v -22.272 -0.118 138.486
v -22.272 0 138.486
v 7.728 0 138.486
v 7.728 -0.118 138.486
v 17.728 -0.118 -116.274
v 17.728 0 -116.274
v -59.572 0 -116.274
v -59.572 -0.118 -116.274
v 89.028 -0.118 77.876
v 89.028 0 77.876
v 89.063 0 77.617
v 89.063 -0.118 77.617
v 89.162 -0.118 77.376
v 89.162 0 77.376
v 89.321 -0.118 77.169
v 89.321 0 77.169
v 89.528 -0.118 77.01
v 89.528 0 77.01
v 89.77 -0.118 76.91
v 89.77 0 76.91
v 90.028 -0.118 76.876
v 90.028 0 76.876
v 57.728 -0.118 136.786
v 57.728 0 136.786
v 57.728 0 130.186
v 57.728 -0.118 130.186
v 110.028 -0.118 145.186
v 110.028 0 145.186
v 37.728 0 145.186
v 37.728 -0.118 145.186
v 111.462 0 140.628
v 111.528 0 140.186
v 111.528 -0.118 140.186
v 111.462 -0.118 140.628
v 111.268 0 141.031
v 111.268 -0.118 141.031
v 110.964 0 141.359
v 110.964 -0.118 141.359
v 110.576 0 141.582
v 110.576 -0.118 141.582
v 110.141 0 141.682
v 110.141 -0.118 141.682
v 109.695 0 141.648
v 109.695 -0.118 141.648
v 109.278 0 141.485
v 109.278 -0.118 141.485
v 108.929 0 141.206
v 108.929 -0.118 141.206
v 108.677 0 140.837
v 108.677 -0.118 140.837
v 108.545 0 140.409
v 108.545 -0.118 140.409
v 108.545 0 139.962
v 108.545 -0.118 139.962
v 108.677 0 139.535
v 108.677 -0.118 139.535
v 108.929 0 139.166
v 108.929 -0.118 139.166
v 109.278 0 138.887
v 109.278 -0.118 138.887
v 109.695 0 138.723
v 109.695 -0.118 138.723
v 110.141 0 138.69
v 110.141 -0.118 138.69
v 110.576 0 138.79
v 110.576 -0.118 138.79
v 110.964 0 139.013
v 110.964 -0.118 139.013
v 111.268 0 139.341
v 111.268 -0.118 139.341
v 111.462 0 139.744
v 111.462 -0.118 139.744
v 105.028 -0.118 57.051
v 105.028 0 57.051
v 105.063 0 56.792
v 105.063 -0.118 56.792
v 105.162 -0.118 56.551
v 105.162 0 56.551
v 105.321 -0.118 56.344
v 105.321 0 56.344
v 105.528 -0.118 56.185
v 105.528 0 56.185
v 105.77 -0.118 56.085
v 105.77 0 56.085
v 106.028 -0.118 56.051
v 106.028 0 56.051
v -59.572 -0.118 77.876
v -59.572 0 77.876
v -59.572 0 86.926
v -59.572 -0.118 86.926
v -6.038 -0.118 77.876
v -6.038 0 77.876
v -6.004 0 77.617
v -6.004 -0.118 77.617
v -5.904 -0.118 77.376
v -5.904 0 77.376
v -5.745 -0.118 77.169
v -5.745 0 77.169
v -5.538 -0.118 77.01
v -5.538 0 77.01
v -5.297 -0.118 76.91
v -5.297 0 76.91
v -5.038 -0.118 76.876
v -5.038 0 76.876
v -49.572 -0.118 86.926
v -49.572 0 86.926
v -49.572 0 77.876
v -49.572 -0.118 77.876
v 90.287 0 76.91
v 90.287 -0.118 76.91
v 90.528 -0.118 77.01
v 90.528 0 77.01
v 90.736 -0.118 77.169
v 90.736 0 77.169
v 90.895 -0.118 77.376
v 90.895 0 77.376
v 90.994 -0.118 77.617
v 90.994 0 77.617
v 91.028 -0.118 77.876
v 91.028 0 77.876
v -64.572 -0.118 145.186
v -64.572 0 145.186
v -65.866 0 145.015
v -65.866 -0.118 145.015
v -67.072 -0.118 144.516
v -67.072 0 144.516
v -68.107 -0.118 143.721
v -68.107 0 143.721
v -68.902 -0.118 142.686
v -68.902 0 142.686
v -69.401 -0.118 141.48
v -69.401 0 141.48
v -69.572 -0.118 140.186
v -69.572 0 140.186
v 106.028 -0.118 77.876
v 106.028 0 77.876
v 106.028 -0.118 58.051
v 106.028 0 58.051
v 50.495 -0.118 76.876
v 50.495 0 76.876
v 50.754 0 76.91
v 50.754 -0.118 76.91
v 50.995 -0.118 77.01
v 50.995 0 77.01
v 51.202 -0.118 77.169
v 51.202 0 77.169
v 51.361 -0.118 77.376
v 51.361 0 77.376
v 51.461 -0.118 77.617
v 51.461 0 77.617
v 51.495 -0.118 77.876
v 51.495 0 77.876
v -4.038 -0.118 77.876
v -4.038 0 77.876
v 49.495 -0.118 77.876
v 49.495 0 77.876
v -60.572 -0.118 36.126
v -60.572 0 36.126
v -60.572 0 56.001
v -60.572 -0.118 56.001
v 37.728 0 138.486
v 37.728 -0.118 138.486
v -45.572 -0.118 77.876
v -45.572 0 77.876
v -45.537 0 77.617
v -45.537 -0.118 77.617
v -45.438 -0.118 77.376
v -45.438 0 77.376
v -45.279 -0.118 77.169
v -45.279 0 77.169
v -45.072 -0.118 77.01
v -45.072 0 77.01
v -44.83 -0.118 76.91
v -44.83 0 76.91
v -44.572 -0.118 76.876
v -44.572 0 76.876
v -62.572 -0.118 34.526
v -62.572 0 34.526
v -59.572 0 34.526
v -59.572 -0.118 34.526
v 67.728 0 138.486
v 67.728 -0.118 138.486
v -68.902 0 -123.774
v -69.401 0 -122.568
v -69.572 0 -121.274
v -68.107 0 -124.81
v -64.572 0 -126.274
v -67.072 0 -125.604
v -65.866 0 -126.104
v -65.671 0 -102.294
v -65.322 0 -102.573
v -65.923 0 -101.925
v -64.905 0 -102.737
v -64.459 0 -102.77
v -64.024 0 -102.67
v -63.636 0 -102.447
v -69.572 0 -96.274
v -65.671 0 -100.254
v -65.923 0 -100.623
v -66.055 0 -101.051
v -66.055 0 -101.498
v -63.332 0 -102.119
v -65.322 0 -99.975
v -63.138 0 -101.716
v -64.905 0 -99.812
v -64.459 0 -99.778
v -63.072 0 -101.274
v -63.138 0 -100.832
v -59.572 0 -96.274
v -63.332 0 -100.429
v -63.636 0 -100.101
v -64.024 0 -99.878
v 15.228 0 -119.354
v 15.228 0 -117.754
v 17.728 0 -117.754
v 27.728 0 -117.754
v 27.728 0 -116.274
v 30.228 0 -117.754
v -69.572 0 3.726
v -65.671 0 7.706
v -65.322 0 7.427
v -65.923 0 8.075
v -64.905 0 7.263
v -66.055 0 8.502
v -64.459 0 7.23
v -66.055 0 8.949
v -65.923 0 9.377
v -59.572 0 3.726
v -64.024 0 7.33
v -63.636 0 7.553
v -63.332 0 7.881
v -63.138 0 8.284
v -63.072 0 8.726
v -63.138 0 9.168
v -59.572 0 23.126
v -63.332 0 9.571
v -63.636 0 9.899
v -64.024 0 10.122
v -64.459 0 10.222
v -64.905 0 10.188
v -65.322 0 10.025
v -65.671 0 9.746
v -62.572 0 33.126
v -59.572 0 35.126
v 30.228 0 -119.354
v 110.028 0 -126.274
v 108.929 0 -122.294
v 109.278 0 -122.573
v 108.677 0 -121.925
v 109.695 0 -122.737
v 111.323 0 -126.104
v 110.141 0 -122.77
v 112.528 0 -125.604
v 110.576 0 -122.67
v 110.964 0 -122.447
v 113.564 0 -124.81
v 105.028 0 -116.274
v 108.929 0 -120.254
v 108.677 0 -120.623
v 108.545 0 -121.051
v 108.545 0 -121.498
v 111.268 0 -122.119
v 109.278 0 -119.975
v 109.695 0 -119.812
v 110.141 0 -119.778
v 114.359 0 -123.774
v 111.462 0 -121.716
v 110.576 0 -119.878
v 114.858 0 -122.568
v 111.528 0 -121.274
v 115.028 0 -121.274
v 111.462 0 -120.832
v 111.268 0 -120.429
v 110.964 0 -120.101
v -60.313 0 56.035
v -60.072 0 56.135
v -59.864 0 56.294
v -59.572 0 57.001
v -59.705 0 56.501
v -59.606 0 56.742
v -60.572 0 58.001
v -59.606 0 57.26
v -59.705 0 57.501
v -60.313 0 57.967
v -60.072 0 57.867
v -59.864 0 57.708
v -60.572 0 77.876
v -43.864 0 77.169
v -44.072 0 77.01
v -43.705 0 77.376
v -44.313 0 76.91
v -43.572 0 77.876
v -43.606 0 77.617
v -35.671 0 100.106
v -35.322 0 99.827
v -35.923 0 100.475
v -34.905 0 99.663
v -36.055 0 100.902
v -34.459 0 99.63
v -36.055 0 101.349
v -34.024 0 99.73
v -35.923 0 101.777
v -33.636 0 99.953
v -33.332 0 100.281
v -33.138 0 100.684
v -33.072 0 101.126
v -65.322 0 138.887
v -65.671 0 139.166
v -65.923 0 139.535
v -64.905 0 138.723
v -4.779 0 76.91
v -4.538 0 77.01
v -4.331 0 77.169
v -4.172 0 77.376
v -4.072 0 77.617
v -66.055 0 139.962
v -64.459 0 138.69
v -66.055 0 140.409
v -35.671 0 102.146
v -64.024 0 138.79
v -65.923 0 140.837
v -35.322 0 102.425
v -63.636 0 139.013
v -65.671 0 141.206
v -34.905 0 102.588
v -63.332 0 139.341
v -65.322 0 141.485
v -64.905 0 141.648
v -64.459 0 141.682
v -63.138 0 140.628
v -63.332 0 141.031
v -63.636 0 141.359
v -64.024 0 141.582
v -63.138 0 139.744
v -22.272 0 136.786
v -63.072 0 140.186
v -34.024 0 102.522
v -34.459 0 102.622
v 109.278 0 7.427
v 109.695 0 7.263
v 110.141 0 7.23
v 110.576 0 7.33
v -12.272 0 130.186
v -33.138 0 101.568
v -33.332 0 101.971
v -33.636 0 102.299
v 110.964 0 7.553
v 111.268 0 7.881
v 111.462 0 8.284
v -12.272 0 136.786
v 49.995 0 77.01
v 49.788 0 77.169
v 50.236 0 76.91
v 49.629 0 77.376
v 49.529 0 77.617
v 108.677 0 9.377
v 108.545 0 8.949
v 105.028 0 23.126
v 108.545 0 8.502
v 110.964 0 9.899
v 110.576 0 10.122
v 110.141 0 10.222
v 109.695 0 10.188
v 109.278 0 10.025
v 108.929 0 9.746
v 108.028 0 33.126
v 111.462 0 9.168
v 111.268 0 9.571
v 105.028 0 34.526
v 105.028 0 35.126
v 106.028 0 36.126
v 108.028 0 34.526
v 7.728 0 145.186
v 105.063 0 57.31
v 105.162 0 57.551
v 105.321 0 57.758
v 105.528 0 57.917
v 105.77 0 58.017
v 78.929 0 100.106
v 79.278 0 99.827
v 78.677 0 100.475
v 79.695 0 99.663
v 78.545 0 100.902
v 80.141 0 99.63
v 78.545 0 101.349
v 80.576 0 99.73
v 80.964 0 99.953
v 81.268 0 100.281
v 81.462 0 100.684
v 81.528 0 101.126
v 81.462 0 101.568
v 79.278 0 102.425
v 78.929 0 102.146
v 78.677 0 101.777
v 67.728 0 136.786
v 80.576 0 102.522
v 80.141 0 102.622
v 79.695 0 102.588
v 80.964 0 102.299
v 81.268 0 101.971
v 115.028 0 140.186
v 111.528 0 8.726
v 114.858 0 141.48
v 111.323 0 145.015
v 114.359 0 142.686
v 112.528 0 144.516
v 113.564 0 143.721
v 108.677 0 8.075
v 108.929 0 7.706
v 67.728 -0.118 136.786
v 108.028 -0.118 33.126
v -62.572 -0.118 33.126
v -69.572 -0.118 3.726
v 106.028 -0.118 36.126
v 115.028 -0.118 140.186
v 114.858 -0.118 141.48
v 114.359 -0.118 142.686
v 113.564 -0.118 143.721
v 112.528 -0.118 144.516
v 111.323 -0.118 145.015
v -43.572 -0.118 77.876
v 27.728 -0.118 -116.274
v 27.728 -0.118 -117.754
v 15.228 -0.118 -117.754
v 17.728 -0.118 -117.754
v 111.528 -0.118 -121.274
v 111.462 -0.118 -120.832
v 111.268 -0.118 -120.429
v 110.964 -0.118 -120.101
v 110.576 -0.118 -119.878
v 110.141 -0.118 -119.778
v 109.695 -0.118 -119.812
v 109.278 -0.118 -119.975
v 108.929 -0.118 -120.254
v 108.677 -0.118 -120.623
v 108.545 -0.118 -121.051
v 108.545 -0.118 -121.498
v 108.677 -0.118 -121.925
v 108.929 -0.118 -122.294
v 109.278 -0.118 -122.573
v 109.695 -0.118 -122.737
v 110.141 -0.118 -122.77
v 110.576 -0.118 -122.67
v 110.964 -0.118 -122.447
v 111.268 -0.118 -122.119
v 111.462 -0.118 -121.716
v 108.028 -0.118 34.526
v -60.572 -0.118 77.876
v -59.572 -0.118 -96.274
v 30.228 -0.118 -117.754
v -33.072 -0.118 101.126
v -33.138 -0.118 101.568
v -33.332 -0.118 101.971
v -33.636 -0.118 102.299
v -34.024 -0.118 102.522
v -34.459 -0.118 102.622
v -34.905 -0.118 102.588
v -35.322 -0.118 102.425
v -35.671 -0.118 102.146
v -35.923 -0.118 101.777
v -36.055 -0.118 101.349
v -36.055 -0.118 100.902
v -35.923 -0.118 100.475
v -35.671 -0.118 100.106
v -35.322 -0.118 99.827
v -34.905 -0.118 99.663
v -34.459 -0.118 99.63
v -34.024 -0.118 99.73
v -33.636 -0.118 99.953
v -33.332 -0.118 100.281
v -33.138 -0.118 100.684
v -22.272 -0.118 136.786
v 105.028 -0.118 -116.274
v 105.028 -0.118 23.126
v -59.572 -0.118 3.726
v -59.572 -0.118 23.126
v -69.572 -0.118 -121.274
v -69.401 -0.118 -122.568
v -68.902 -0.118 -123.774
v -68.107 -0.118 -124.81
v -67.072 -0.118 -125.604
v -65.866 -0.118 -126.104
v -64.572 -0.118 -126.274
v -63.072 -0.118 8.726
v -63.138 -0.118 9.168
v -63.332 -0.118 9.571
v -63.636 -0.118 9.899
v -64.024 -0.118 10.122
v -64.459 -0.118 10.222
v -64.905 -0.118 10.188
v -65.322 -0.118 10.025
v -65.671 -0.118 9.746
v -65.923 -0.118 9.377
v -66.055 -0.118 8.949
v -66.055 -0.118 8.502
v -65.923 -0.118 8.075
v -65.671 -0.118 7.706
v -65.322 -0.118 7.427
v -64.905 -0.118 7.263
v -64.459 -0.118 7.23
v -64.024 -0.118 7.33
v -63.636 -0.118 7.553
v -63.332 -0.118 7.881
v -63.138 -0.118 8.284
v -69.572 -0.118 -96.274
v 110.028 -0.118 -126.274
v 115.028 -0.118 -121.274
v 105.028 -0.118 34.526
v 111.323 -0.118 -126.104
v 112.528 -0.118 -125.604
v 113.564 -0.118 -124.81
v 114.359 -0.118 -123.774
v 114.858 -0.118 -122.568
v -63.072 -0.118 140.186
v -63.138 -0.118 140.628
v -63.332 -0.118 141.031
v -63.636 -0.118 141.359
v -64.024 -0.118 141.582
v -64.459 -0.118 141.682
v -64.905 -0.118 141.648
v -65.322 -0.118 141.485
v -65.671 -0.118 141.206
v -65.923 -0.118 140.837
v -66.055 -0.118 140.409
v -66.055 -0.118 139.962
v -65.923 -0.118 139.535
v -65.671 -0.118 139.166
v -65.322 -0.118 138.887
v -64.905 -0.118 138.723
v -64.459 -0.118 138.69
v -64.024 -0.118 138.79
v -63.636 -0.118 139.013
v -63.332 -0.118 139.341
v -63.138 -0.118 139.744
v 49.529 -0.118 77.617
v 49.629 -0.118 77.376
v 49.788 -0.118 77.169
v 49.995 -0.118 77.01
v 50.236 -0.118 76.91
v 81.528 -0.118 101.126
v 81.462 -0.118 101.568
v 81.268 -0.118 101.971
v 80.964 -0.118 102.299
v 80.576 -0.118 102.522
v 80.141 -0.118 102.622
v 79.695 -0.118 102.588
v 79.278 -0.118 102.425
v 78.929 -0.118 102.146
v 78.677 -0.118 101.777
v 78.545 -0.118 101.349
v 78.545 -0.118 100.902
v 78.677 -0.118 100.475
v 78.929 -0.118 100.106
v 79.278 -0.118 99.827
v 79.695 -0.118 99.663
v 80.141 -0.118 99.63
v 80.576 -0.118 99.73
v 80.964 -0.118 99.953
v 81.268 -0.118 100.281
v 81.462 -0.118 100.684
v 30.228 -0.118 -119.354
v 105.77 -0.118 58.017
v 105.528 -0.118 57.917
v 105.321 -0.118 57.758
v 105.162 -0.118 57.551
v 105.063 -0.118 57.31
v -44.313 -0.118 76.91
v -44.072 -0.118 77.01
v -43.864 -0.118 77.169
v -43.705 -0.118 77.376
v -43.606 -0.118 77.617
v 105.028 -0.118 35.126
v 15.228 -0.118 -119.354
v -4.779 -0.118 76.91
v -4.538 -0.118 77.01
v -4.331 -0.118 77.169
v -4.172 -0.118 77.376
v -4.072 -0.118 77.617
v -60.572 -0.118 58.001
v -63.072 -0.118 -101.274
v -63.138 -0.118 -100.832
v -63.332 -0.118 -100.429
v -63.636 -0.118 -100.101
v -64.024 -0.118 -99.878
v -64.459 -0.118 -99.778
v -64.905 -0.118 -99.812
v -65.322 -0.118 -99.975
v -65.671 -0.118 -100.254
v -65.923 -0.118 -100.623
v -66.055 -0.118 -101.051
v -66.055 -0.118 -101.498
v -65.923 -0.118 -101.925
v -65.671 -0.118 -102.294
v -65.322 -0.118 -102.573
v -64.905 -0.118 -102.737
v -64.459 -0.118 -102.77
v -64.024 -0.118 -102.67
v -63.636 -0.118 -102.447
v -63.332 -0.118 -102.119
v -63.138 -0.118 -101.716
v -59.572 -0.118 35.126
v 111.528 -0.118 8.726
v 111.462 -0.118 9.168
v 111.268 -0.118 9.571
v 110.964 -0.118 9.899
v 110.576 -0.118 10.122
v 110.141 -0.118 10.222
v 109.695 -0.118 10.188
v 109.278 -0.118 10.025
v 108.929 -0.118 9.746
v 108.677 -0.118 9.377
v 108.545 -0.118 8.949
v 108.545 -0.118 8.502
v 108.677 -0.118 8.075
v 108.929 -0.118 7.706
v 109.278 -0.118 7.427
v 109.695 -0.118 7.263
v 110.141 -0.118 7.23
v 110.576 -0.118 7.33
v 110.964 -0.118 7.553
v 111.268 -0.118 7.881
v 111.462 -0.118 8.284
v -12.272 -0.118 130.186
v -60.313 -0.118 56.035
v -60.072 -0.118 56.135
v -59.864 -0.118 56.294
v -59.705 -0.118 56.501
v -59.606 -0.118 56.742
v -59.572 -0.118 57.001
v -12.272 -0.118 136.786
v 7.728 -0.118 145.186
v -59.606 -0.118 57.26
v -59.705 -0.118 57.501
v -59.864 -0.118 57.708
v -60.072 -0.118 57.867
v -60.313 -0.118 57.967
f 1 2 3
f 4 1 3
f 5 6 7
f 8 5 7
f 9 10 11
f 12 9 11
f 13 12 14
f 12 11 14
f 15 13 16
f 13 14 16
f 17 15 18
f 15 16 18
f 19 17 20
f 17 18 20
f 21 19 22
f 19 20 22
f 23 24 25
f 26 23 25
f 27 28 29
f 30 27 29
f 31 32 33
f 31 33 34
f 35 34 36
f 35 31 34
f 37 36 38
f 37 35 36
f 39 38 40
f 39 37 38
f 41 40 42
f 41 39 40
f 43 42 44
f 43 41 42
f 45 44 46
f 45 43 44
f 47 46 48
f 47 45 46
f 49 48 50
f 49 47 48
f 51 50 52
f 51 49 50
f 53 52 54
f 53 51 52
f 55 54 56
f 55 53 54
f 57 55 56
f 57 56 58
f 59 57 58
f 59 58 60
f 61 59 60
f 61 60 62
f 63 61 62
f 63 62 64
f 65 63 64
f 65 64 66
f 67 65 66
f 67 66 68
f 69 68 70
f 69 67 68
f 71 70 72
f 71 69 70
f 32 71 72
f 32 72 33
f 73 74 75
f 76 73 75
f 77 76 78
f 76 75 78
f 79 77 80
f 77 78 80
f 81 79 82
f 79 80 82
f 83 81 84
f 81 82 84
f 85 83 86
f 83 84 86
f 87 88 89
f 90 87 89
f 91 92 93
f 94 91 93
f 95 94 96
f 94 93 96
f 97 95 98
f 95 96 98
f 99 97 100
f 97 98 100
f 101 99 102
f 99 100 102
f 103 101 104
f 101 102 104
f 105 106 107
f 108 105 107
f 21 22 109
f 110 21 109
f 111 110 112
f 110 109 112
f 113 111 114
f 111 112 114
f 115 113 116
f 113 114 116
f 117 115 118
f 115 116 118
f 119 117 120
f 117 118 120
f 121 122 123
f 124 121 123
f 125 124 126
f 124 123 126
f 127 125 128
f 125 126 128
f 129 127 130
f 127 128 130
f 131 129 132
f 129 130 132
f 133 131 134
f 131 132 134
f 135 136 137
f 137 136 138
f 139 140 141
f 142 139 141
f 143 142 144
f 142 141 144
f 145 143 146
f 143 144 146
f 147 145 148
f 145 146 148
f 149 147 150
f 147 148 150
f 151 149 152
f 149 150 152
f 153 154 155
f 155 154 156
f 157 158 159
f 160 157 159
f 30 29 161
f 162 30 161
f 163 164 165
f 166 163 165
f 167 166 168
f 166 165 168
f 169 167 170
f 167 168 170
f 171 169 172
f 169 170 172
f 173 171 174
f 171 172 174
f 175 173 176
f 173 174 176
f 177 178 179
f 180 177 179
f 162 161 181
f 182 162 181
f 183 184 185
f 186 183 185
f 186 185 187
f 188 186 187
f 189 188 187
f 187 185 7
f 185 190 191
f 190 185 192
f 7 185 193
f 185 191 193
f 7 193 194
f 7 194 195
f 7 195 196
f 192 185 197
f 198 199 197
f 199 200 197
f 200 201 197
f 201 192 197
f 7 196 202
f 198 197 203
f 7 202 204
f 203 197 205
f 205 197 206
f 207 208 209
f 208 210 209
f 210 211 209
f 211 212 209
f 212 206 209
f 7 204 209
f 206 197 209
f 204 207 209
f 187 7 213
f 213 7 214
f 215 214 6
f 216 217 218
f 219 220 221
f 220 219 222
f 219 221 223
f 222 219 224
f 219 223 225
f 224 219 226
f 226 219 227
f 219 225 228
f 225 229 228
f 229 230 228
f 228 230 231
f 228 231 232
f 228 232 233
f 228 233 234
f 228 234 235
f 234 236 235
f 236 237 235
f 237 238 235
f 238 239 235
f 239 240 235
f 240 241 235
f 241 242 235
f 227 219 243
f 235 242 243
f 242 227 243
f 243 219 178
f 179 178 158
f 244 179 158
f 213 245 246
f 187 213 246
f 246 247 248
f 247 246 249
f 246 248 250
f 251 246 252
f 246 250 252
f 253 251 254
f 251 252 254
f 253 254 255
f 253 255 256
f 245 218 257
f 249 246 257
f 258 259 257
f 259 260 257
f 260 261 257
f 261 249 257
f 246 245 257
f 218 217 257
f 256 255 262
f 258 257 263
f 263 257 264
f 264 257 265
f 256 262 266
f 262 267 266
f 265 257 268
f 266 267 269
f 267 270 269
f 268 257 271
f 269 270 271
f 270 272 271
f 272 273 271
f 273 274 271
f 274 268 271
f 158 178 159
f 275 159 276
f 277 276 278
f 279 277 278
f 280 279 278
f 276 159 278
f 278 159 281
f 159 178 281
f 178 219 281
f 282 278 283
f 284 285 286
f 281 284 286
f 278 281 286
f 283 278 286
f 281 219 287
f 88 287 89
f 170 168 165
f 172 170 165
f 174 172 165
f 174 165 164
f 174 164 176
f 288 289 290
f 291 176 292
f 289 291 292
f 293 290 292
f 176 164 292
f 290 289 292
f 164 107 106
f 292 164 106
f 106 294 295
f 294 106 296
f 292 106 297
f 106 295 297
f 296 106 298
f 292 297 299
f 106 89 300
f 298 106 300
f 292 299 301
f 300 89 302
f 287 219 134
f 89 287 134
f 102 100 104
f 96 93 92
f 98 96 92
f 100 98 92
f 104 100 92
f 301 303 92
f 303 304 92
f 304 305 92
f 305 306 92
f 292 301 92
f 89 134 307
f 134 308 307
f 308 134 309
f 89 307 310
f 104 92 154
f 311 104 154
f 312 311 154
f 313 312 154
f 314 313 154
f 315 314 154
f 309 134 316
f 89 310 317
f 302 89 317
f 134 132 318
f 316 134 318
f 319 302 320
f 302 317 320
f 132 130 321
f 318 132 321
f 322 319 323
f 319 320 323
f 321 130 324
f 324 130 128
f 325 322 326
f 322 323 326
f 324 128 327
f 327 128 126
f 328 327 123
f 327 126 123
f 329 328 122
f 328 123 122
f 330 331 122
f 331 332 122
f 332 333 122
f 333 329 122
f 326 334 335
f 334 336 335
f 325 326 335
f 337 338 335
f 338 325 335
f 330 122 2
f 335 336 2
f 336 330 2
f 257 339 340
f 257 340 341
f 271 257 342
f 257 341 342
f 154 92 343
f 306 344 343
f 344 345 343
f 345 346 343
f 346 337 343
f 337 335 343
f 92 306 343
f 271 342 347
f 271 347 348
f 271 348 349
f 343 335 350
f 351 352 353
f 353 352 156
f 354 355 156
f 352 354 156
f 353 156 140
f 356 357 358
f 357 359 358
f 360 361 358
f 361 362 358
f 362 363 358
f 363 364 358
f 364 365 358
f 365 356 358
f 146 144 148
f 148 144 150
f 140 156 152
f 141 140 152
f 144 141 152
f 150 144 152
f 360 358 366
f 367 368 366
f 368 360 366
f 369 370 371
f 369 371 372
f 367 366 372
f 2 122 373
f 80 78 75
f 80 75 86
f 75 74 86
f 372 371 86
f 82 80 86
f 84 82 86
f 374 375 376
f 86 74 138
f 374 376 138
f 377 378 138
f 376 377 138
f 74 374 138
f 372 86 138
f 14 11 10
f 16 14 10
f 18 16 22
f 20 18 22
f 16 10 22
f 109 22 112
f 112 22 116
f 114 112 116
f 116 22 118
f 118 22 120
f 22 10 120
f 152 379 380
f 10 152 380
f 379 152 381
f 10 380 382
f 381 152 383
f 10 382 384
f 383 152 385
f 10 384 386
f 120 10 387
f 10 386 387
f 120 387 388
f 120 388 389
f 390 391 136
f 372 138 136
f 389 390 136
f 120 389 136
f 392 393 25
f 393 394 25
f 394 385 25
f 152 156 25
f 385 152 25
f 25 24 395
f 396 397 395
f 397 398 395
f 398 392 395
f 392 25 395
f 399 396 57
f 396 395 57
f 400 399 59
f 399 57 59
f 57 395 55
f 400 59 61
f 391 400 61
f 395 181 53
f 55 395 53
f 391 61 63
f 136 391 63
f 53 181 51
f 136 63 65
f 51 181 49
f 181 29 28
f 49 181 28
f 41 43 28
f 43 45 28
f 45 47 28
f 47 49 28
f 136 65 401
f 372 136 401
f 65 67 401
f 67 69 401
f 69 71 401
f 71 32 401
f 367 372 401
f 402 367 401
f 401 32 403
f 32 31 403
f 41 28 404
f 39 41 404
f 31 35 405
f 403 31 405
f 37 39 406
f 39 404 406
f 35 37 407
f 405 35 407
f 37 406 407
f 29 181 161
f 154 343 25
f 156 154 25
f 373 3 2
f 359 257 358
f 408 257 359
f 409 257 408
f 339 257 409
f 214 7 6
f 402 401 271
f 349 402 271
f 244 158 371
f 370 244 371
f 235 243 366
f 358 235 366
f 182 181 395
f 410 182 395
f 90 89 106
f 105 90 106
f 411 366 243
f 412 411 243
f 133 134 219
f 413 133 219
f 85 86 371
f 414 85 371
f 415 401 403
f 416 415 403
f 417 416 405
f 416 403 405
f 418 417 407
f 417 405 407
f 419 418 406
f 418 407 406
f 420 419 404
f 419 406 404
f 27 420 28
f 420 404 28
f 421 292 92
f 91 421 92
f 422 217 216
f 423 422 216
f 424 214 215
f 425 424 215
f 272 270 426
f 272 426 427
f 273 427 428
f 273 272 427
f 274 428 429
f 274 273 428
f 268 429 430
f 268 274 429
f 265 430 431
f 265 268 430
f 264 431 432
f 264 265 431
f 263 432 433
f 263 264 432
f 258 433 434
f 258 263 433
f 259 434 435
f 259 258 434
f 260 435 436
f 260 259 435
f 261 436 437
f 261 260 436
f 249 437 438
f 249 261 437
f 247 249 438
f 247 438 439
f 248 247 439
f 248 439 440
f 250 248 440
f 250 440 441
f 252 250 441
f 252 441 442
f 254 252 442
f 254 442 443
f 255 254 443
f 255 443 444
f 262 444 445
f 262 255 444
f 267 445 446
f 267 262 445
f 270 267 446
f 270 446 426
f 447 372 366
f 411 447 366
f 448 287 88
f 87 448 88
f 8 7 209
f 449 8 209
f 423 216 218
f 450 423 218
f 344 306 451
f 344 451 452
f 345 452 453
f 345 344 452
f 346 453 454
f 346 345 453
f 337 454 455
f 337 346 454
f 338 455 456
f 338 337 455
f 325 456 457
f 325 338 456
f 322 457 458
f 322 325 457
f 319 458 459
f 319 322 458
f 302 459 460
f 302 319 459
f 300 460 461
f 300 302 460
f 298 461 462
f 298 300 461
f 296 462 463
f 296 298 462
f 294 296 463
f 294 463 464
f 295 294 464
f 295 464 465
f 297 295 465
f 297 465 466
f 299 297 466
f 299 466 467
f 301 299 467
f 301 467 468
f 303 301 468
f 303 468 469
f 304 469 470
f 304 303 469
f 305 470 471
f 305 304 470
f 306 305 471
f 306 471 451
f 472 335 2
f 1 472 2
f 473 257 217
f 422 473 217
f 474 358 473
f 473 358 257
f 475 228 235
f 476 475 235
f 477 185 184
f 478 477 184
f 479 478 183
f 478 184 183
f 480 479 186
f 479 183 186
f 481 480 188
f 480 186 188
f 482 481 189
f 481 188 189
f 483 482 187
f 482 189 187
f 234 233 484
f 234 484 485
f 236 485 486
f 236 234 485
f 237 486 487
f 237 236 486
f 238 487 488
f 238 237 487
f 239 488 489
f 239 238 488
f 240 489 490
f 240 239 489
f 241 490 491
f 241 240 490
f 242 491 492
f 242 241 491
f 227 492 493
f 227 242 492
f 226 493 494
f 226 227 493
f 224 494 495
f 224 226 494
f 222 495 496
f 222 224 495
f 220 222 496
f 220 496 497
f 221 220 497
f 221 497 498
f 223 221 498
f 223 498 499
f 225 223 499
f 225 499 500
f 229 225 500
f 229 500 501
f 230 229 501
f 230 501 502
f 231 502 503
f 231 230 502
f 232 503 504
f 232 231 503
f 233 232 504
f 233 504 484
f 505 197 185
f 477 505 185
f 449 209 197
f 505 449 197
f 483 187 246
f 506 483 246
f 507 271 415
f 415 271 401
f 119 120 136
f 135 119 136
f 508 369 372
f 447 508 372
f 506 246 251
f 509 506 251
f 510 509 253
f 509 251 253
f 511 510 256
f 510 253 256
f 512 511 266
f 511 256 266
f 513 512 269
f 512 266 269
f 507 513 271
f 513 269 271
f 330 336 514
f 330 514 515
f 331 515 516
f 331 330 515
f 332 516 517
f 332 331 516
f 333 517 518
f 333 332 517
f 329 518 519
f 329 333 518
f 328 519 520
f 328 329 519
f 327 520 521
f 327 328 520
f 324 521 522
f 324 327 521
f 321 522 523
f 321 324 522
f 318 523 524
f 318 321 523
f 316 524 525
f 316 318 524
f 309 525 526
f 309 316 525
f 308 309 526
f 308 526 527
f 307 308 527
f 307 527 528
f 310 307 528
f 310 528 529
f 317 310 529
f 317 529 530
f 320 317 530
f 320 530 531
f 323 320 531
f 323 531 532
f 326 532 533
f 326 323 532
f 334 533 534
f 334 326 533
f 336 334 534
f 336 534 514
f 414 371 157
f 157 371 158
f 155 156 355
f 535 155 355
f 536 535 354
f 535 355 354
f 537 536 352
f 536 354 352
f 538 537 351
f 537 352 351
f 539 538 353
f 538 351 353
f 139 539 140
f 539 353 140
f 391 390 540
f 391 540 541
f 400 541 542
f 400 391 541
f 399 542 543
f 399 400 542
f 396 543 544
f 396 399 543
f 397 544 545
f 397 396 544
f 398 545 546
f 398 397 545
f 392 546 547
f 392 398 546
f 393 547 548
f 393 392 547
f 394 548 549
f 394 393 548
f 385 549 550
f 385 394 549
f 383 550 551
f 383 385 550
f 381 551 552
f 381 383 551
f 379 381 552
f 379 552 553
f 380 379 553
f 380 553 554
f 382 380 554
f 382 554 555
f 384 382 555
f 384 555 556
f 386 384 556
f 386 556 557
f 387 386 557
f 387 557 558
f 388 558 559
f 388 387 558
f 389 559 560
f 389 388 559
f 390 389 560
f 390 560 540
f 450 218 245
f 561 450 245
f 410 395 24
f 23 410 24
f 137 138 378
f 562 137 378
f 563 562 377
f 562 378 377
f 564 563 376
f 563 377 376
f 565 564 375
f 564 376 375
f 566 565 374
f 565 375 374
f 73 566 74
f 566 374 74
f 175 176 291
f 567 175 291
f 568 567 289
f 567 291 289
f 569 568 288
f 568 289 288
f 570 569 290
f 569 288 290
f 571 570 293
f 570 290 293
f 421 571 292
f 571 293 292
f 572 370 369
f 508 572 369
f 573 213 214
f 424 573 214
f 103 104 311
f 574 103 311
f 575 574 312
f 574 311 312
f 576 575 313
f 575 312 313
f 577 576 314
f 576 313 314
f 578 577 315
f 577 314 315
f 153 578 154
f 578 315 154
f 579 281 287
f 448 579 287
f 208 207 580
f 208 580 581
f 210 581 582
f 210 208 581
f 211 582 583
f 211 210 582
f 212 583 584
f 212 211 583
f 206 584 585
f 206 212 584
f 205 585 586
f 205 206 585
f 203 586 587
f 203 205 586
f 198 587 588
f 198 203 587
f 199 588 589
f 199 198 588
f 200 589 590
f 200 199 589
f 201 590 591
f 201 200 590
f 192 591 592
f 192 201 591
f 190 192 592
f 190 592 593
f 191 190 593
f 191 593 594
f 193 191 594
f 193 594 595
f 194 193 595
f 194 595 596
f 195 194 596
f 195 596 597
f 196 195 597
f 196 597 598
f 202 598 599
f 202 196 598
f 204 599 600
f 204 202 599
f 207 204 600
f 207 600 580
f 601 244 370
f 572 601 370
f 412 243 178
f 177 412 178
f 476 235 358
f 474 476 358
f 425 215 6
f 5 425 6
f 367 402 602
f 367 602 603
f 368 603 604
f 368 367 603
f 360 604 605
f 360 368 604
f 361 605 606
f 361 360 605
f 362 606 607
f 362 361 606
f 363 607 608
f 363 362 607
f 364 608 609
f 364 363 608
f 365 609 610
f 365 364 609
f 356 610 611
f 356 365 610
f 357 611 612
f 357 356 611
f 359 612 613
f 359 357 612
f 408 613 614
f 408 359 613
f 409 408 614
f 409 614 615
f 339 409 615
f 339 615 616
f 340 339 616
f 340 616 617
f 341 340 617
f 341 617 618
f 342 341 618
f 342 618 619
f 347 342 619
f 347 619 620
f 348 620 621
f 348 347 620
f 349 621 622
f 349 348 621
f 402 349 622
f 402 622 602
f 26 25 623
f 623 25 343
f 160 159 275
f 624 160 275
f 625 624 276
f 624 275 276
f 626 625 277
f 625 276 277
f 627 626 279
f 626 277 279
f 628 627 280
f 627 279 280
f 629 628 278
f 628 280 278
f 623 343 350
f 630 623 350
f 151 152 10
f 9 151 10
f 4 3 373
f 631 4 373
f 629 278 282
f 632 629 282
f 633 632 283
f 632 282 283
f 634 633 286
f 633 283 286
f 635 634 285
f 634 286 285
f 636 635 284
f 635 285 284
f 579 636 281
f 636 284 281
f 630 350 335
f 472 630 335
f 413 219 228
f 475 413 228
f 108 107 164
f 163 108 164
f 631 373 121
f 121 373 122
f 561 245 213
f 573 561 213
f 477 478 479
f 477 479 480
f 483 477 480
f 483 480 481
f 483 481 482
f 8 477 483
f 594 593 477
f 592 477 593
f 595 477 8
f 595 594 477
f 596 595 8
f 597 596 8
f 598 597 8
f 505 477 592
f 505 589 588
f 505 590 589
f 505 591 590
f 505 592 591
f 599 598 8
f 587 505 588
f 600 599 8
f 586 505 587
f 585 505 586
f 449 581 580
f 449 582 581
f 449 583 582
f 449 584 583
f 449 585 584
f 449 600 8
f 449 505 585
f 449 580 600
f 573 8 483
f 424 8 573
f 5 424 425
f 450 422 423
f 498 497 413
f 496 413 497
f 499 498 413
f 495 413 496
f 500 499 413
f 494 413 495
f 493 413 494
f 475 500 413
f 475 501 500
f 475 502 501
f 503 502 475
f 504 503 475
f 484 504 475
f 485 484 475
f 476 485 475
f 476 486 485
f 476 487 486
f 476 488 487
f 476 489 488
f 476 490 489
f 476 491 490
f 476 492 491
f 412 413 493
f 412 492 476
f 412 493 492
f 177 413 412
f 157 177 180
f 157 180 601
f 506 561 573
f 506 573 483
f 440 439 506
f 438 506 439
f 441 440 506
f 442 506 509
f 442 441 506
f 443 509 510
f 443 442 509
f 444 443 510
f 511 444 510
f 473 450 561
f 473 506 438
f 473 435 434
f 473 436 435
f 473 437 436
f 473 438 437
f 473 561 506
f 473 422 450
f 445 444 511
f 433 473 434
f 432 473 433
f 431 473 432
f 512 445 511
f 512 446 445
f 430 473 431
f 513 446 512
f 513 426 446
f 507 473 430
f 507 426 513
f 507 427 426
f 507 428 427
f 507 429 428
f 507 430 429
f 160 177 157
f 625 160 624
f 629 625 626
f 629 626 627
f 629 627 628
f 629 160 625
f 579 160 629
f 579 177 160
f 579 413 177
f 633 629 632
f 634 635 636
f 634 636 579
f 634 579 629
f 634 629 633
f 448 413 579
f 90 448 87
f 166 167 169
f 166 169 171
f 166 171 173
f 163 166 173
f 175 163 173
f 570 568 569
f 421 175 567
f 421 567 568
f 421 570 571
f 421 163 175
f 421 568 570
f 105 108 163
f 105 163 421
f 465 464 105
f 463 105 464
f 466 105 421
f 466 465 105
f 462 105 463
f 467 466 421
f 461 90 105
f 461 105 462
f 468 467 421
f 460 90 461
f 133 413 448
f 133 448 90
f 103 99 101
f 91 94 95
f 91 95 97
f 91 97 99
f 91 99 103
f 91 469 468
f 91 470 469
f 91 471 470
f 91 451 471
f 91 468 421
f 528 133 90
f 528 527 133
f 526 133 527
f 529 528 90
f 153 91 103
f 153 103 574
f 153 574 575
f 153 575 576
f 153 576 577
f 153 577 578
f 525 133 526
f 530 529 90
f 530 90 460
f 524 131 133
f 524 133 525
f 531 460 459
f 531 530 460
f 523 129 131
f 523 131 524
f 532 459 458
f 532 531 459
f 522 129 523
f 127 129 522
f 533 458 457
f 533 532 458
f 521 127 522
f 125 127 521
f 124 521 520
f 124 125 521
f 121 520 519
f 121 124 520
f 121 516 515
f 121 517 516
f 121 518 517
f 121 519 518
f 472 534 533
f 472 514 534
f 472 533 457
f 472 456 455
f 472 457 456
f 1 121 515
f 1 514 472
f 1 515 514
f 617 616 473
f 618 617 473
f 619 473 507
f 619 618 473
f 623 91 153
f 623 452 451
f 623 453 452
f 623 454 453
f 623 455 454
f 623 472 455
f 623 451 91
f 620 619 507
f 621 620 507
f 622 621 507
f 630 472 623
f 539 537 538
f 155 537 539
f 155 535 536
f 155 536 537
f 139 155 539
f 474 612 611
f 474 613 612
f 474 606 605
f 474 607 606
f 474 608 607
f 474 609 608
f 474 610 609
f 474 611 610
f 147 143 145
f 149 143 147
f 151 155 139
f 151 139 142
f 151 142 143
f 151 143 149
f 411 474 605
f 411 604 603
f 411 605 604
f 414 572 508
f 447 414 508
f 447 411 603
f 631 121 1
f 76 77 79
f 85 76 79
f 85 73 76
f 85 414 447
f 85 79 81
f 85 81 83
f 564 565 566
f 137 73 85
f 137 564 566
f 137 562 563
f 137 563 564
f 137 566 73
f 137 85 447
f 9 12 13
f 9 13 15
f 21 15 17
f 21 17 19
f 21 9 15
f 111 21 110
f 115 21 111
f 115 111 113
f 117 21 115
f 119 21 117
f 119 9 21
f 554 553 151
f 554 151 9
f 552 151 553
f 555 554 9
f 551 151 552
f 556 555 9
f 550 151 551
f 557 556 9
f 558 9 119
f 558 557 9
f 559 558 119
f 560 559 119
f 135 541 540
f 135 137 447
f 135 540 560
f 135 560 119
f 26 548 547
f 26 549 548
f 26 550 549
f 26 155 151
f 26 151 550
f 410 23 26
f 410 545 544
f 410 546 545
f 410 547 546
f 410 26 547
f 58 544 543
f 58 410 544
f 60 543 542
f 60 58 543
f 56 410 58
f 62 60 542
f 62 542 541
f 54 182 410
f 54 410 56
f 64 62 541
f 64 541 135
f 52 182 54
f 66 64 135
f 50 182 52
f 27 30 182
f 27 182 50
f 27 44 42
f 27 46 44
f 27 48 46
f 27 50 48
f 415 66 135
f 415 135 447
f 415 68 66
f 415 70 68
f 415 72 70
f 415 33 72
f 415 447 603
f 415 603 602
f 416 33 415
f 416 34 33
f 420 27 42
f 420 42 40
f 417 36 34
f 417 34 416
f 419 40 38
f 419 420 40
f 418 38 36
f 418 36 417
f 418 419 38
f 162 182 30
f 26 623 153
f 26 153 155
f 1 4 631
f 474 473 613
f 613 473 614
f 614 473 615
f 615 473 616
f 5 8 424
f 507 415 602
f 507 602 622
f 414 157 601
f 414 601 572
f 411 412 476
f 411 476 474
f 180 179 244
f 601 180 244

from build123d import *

# Parameters (mm, degrees)
F0_R     = 1.5
F0_W     = 3
F0_H     = 0.6
F0_W_2   = 57.3
F0_H_2   = 10
F0_W_3   = 1.3
F0_H_3   = 1
F0_W_4   = 30
F0_H_4   = 52.31
F1_DEPTH = 0.118


with BuildPart() as f1:
    # F0 (on Front) → F1 (new body)
    with BuildSketch(Plane.XZ):
        with BuildLine():
            Line((110.0284859866, 145.1858304774), (37.7284859866, 145.1858304774))
            Line((37.7284859866, 145.1858304774), (37.7284859866, 138.4858304774))
            Line((37.7284859866, 138.4858304774), (67.7284859866, 138.4858304774))
            Line((67.7284859866, 138.4858304774), (67.7284859866, 136.7858304774))
            Line((67.7284859866, 136.7858304774), (57.7284859866, 136.7858304774))
            Line((57.7284859866, 136.7858304774), (57.7284859866, 135.1858304774))
            Line((57.7284859866, 135.1858304774), (105.0284859866, 135.1858304774))
            Line((105.0284859866, 135.1858304774), (105.0284859866, 77.8758304774))
            Line((105.0284859866, 77.8758304774), (106.0284859866, 77.8758304774))
            Line((106.0284859866, 77.8758304774), (106.0284859866, 58.0508304774))
            ThreePointArc((106.0284859866, 58.0508304774), (106.7355927678, 57.7579372586), (107.0284859866, 57.0508304774))
            ThreePointArc((107.0284859866, 57.0508304774), (106.7355927678, 56.3437236962), (106.0284859866, 56.0508304774))
            Line((106.0284859866, 56.0508304774), (106.0284859866, 36.1258304774))
            Line((106.0284859866, 36.1258304774), (105.0284859866, 36.1258304774))
            Line((105.0284859866, 36.1258304774), (105.0284859866, 35.1258304774))
            Line((105.0284859866, 35.1258304774), (108.0284859866, 35.1258304774))
            Line((108.0284859866, 35.1258304774), (108.0284859866, 34.5258304774))
            Line((108.0284859866, 34.5258304774), (108.0284859866, 33.1258304774))
            Line((108.0284859866, 33.1258304774), (105.0284859866, 33.1258304774))
            Line((105.0284859866, 33.1258304774), (105.0284859866, 23.1258304774))
            Line((105.0284859866, 23.1258304774), (105.0284859866, -116.2741695226))
            Line((105.0284859866, -116.2741695226), (27.7284859866, -116.2741695226))
            Line((27.7284859866, -116.2741695226), (27.7284859866, -117.7541695226))
            Line((27.7284859866, -117.7541695226), (30.2284859866, -117.7541695226))
            Line((30.2284859866, -117.7541695226), (30.2284859866, -119.3541695226))
            Line((30.2284859866, -119.3541695226), (15.2284859866, -119.3541695226))
            Line((15.2284859866, -119.3541695226), (15.2284859866, -117.7541695226))
            Line((15.2284859866, -117.7541695226), (17.7284859866, -117.7541695226))
            Line((17.7284859866, -117.7541695226), (17.7284859866, -116.2741695226))
            Line((17.7284859866, -116.2741695226), (-59.5715140134, -116.2741695226))
            Line((-59.5715140134, -116.2741695226), (-59.5715140134, -96.2741695226))
            Line((-59.5715140134, -96.2741695226), (-69.5715140134, -96.2741695226))
            Line((-69.5715140134, -96.2741695226), (-69.5715140134, -121.2741695226))
            ThreePointArc((-69.5715140134, -121.2741695226), (-68.1070479193, -124.8097034285), (-64.5715140134, -126.2741695226))
            Line((-64.5715140134, -126.2741695226), (110.0284859866, -126.2741695226))
            ThreePointArc((110.0284859866, -126.2741695226), (113.5640198925, -124.8097034285), (115.0284859866, -121.2741695226))
            Line((115.0284859866, -121.2741695226), (115.0284859866, 140.1858304774))
            ThreePointArc((115.0284859866, 140.1858304774), (113.5640198925, 143.7213643833), (110.0284859866, 145.1858304774))
        make_face()
        with Locations((-64.5715140134, -101.2741695226)):
            Circle(F0_R, mode=Mode.SUBTRACT)
        with Locations((110.0284859866, -121.2741695226)):
            Circle(F0_R, mode=Mode.SUBTRACT)
        with Locations((110.0284859866, 8.7258304774)):
            Circle(F0_R, mode=Mode.SUBTRACT)
        with Locations((110.0284859866, 140.1858304774)):
            Circle(F0_R, mode=Mode.SUBTRACT)
        with Locations((-61.0715140134, 34.8258304774)):
            Rectangle(F0_W, F0_H)
        with Locations((106.5284859866, 34.8258304774)):
            Rectangle(F0_W, F0_H)
        with BuildLine():
            Line((7.7284859866, 77.8758304774), (7.7284859866, 130.1858304774))
            Line((7.7284859866, 130.1858304774), (-12.2715140134, 130.1858304774))
            Line((-12.2715140134, 130.1858304774), (-38.5766702966, 77.8758304774))
            Line((-38.5766702966, 77.8758304774), (-6.0381810134, 77.8758304774))
            ThreePointArc((-6.0381810134, 77.8758304774), (-5.0381810134, 78.8758304774), (-4.0381810134, 77.8758304774))
            Line((-4.0381810134, 77.8758304774), (7.7284859866, 77.8758304774))
        make_face()
        with Locations((66.3784859866, 28.1258304774)):
            Rectangle(F0_W_2, F0_H_2)
        with Locations((-20.9215140134, 28.1258304774)):
            Rectangle(F0_W_2, F0_H_2)
        with BuildLine():
            Line((105.0284859866, 135.1858304774), (57.7284859866, 135.1858304774))
            Line((57.7284859866, 135.1858304774), (57.7284859866, 130.1858304774))
            Line((57.7284859866, 130.1858304774), (84.0336422698, 77.8758304774))
            Line((84.0336422698, 77.8758304774), (89.0284859866, 77.8758304774))
            ThreePointArc((89.0284859866, 77.8758304774), (90.0284859866, 78.8758304774), (91.0284859866, 77.8758304774))
            Line((91.0284859866, 77.8758304774), (105.0284859866, 77.8758304774))
            Line((105.0284859866, 77.8758304774), (105.0284859866, 135.1858304774))
        make_face()
        with Locations((80.0284859866, 101.1258304774)):
            Circle(F0_R, mode=Mode.SUBTRACT)
        with BuildLine():
            Line((57.7284859866, 130.1858304774), (37.7284859866, 130.1858304774))
            Line((37.7284859866, 130.1858304774), (37.7284859866, 77.8758304774))
            Line((37.7284859866, 77.8758304774), (49.4951559866, 77.8758304774))
            ThreePointArc((49.4951559866, 77.8758304774), (50.4951559866, 78.8758304774), (51.4951559866, 77.8758304774))
            Line((51.4951559866, 77.8758304774), (84.0336422698, 77.8758304774))
            Line((84.0336422698, 77.8758304774), (57.7284859866, 130.1858304774))
        make_face()
        with BuildLine():
            ThreePointArc((107.0284859866, 57.0508304774), (106.7355927678, 57.7579372586), (106.0284859866, 58.0508304774))
            Line((106.0284859866, 58.0508304774), (106.0284859866, 56.0508304774))
            ThreePointArc((106.0284859866, 56.0508304774), (106.7355927678, 56.3437236962), (107.0284859866, 57.0508304774))
        make_face()
        with BuildLine():
            ThreePointArc((51.4951559866, 77.8758304774), (50.4951559866, 78.8758304774), (49.4951559866, 77.8758304774))
            Line((49.4951559866, 77.8758304774), (51.4951559866, 77.8758304774))
        make_face()
        with BuildLine():
            Line((-60.5715140134, 56.0008304774), (-60.5715140134, 58.0008304774))
            ThreePointArc((-60.5715140134, 58.0008304774), (-61.5715140134, 57.0008304774), (-60.5715140134, 56.0008304774))
        make_face()
        Polygon((37.7284859866, 36.1258304774), (37.7284859866, 35.1258304774), (95.0284859866, 35.1258304774), (95.0284859866, 36.1258304774), (85.0284859866, 36.1258304774), align=None)
        with BuildLine():
            Line((-6.0381810134, 77.8758304774), (-4.0381810134, 77.8758304774))
            ThreePointArc((-4.0381810134, 77.8758304774), (-5.0381810134, 78.8758304774), (-6.0381810134, 77.8758304774))
        make_face()
        Polygon((-49.5715140134, 36.1258304774), (-49.5715140134, 35.1258304774), (7.7284859866, 35.1258304774), (7.7284859866, 36.1258304774), (-39.5715140134, 36.1258304774), align=None)
        with BuildLine():
            Line((51.4951559866, 77.8758304774), (49.4951559866, 77.8758304774))
            ThreePointArc((49.4951559866, 77.8758304774), (49.7880492054, 77.1687236962), (50.4951559866, 76.8758304774))
            ThreePointArc((50.4951559866, 76.8758304774), (51.2022627678, 77.1687236962), (51.4951559866, 77.8758304774))
        make_face()
        with BuildLine():
            Line((106.0284859866, 56.0508304774), (106.0284859866, 58.0508304774))
            ThreePointArc((106.0284859866, 58.0508304774), (105.3213792054, 57.7579372586), (105.0284859866, 57.0508304774))
            ThreePointArc((105.0284859866, 57.0508304774), (105.3213792054, 56.3437236962), (106.0284859866, 56.0508304774))
        make_face()
        with BuildLine():
            ThreePointArc((-5.0381810151, 76.8758304774), (-4.3310742328, 77.1687236956), (-4.0381810134, 77.8758304774))
            Line((-4.0381810134, 77.8758304774), (-6.0381810134, 77.8758304774))
            ThreePointArc((-6.0381810134, 77.8758304774), (-5.7452877952, 77.1687236968), (-5.0381810151, 76.8758304774))
        make_face()
        with BuildLine():
            ThreePointArc((-60.5715140134, 56.0008304774), (-59.8644072322, 56.2937236962), (-59.5715140134, 57.0008304774))
            ThreePointArc((-59.5715140134, 57.0008304774), (-59.8644072322, 57.7079372586), (-60.5715140134, 58.0008304774))
            Line((-60.5715140134, 58.0008304774), (-60.5715140134, 56.0008304774))
        make_face()
        with BuildLine():
            Line((7.7284859866, 145.1858304774), (-64.5715140134, 145.1858304774))
            ThreePointArc((-64.5715140134, 145.1858304774), (-68.1070479193, 143.7213643833), (-69.5715140134, 140.1858304774))
            Line((-69.5715140134, 140.1858304774), (-69.5715140134, 3.7258304774))
            Line((-69.5715140134, 3.7258304774), (-59.5715140134, 3.7258304774))
            Line((-59.5715140134, 3.7258304774), (-59.5715140134, 23.1258304774))
            Line((-59.5715140134, 23.1258304774), (-59.5715140134, 33.1258304774))
            Line((-59.5715140134, 33.1258304774), (-62.5715140134, 33.1258304774))
            Line((-62.5715140134, 33.1258304774), (-62.5715140134, 34.5258304774))
            Line((-62.5715140134, 34.5258304774), (-62.5715140134, 35.1258304774))
            Line((-62.5715140134, 35.1258304774), (-59.5715140134, 35.1258304774))
            Line((-59.5715140134, 35.1258304774), (-59.5715140134, 36.1258304774))
            Line((-59.5715140134, 36.1258304774), (-60.5715140134, 36.1258304774))
            Line((-60.5715140134, 36.1258304774), (-60.5715140134, 56.0008304774))
            ThreePointArc((-60.5715140134, 56.0008304774), (-61.5715140134, 57.0008304774), (-60.5715140134, 58.0008304774))
            Line((-60.5715140134, 58.0008304774), (-60.5715140134, 77.8758304774))
            Line((-60.5715140134, 77.8758304774), (-59.5715140134, 77.8758304774))
            Line((-59.5715140134, 77.8758304774), (-59.5715140134, 86.9258304774))
            Line((-59.5715140134, 86.9258304774), (-59.5715140134, 135.1858304774))
            Line((-59.5715140134, 135.1858304774), (-12.2715140134, 135.1858304774))
            Line((-12.2715140134, 135.1858304774), (-12.2715140134, 136.7858304774))
            Line((-12.2715140134, 136.7858304774), (-22.2715140134, 136.7858304774))
            Line((-22.2715140134, 136.7858304774), (-22.2715140134, 138.4858304774))
            Line((-22.2715140134, 138.4858304774), (7.7284859866, 138.4858304774))
            Line((7.7284859866, 138.4858304774), (7.7284859866, 145.1858304774))
        make_face()
        with Locations((-64.5715140134, 8.7258304774)):
            Circle(F0_R, mode=Mode.SUBTRACT)
        with Locations((-64.5715140134, 140.1858304774)):
            Circle(F0_R, mode=Mode.SUBTRACT)
        with BuildLine():
            Line((-12.2715140134, 130.1858304774), (-12.2715140134, 135.1858304774))
            Line((-12.2715140134, 135.1858304774), (-59.5715140134, 135.1858304774))
            Line((-59.5715140134, 135.1858304774), (-59.5715140134, 86.9258304774))
            Line((-59.5715140134, 86.9258304774), (-49.5715140134, 86.9258304774))
            Line((-49.5715140134, 86.9258304774), (-49.5715140134, 77.8758304774))
            Line((-49.5715140134, 77.8758304774), (-45.5715140134, 77.8758304774))
            ThreePointArc((-45.5715140134, 77.8758304774), (-44.5715140134, 78.8758304774), (-43.5715140134, 77.8758304774))
            Line((-43.5715140134, 77.8758304774), (-38.5766702966, 77.8758304774))
            Line((-38.5766702966, 77.8758304774), (-12.2715140134, 130.1858304774))
        make_face()
        with Locations((-34.5715140134, 101.1258304774)):
            Circle(F0_R, mode=Mode.SUBTRACT)
        with BuildLine():
            ThreePointArc((90.0284859866, 76.8758304774), (90.7355927678, 77.1687236962), (91.0284859866, 77.8758304774))
            Line((91.0284859866, 77.8758304774), (89.0284859866, 77.8758304774))
            ThreePointArc((89.0284859866, 77.8758304774), (89.3213792054, 77.1687236962), (90.0284859866, 76.8758304774))
        make_face()
        with BuildLine():
            Line((89.0284859866, 77.8758304774), (91.0284859866, 77.8758304774))
            ThreePointArc((91.0284859866, 77.8758304774), (90.0284859866, 78.8758304774), (89.0284859866, 77.8758304774))
        make_face()
        with BuildLine():
            ThreePointArc((-44.5715140134, 76.8758304774), (-43.8644072322, 77.1687236962), (-43.5715140134, 77.8758304774))
            Line((-43.5715140134, 77.8758304774), (-45.5715140134, 77.8758304774))
            ThreePointArc((-45.5715140134, 77.8758304774), (-45.2786207946, 77.1687236962), (-44.5715140134, 76.8758304774))
        make_face()
        with BuildLine():
            Line((-45.5715140134, 77.8758304774), (-43.5715140134, 77.8758304774))
            ThreePointArc((-43.5715140134, 77.8758304774), (-44.5715140134, 78.8758304774), (-45.5715140134, 77.8758304774))
        make_face()
        Polygon((-59.5715140134, 33.1258304774), (-59.5715140134, 23.1258304774), (-49.5715140134, 23.1258304774), (-49.5715140134, 33.1258304774), (-58.2715140134, 33.1258304774), align=None)
        Polygon((-58.2715140134, 36.1258304774), (-58.2715140134, 35.1258304774), (-49.5715140134, 35.1258304774), (-49.5715140134, 36.1258304774), (-52.2715140134, 36.1258304774), (-55.2715140134, 36.1258304774), align=None)
        with Locations((-58.9215140134, 35.6258304774)):
            Rectangle(F0_W_3, F0_H_3)
        with Locations((22.7284859866, 35.6258304774)):
            Rectangle(F0_W_4, F0_H_3)
        with Locations((22.7284859866, 28.1258304774)):
            Rectangle(F0_W_4, F0_H_2)
        Polygon((95.0284859866, 36.1258304774), (95.0284859866, 35.1258304774), (103.7284859866, 35.1258304774), (103.7284859866, 36.1258304774), (100.7284859866, 36.1258304774), (97.7284859866, 36.1258304774), align=None)
        with Locations((104.3784859866, 35.6258304774)):
            Rectangle(F0_W_3, F0_H_3)
        Polygon((95.0284859866, 33.1258304774), (95.0284859866, 23.1258304774), (105.0284859866, 23.1258304774), (105.0284859866, 33.1258304774), (103.7284859866, 33.1258304774), align=None)
        with Locations((22.7284859866, 104.0308304774)):
            Rectangle(F0_W_4, F0_H_4)
    extrude(amount=F1_DEPTH)


solid = f1.part
